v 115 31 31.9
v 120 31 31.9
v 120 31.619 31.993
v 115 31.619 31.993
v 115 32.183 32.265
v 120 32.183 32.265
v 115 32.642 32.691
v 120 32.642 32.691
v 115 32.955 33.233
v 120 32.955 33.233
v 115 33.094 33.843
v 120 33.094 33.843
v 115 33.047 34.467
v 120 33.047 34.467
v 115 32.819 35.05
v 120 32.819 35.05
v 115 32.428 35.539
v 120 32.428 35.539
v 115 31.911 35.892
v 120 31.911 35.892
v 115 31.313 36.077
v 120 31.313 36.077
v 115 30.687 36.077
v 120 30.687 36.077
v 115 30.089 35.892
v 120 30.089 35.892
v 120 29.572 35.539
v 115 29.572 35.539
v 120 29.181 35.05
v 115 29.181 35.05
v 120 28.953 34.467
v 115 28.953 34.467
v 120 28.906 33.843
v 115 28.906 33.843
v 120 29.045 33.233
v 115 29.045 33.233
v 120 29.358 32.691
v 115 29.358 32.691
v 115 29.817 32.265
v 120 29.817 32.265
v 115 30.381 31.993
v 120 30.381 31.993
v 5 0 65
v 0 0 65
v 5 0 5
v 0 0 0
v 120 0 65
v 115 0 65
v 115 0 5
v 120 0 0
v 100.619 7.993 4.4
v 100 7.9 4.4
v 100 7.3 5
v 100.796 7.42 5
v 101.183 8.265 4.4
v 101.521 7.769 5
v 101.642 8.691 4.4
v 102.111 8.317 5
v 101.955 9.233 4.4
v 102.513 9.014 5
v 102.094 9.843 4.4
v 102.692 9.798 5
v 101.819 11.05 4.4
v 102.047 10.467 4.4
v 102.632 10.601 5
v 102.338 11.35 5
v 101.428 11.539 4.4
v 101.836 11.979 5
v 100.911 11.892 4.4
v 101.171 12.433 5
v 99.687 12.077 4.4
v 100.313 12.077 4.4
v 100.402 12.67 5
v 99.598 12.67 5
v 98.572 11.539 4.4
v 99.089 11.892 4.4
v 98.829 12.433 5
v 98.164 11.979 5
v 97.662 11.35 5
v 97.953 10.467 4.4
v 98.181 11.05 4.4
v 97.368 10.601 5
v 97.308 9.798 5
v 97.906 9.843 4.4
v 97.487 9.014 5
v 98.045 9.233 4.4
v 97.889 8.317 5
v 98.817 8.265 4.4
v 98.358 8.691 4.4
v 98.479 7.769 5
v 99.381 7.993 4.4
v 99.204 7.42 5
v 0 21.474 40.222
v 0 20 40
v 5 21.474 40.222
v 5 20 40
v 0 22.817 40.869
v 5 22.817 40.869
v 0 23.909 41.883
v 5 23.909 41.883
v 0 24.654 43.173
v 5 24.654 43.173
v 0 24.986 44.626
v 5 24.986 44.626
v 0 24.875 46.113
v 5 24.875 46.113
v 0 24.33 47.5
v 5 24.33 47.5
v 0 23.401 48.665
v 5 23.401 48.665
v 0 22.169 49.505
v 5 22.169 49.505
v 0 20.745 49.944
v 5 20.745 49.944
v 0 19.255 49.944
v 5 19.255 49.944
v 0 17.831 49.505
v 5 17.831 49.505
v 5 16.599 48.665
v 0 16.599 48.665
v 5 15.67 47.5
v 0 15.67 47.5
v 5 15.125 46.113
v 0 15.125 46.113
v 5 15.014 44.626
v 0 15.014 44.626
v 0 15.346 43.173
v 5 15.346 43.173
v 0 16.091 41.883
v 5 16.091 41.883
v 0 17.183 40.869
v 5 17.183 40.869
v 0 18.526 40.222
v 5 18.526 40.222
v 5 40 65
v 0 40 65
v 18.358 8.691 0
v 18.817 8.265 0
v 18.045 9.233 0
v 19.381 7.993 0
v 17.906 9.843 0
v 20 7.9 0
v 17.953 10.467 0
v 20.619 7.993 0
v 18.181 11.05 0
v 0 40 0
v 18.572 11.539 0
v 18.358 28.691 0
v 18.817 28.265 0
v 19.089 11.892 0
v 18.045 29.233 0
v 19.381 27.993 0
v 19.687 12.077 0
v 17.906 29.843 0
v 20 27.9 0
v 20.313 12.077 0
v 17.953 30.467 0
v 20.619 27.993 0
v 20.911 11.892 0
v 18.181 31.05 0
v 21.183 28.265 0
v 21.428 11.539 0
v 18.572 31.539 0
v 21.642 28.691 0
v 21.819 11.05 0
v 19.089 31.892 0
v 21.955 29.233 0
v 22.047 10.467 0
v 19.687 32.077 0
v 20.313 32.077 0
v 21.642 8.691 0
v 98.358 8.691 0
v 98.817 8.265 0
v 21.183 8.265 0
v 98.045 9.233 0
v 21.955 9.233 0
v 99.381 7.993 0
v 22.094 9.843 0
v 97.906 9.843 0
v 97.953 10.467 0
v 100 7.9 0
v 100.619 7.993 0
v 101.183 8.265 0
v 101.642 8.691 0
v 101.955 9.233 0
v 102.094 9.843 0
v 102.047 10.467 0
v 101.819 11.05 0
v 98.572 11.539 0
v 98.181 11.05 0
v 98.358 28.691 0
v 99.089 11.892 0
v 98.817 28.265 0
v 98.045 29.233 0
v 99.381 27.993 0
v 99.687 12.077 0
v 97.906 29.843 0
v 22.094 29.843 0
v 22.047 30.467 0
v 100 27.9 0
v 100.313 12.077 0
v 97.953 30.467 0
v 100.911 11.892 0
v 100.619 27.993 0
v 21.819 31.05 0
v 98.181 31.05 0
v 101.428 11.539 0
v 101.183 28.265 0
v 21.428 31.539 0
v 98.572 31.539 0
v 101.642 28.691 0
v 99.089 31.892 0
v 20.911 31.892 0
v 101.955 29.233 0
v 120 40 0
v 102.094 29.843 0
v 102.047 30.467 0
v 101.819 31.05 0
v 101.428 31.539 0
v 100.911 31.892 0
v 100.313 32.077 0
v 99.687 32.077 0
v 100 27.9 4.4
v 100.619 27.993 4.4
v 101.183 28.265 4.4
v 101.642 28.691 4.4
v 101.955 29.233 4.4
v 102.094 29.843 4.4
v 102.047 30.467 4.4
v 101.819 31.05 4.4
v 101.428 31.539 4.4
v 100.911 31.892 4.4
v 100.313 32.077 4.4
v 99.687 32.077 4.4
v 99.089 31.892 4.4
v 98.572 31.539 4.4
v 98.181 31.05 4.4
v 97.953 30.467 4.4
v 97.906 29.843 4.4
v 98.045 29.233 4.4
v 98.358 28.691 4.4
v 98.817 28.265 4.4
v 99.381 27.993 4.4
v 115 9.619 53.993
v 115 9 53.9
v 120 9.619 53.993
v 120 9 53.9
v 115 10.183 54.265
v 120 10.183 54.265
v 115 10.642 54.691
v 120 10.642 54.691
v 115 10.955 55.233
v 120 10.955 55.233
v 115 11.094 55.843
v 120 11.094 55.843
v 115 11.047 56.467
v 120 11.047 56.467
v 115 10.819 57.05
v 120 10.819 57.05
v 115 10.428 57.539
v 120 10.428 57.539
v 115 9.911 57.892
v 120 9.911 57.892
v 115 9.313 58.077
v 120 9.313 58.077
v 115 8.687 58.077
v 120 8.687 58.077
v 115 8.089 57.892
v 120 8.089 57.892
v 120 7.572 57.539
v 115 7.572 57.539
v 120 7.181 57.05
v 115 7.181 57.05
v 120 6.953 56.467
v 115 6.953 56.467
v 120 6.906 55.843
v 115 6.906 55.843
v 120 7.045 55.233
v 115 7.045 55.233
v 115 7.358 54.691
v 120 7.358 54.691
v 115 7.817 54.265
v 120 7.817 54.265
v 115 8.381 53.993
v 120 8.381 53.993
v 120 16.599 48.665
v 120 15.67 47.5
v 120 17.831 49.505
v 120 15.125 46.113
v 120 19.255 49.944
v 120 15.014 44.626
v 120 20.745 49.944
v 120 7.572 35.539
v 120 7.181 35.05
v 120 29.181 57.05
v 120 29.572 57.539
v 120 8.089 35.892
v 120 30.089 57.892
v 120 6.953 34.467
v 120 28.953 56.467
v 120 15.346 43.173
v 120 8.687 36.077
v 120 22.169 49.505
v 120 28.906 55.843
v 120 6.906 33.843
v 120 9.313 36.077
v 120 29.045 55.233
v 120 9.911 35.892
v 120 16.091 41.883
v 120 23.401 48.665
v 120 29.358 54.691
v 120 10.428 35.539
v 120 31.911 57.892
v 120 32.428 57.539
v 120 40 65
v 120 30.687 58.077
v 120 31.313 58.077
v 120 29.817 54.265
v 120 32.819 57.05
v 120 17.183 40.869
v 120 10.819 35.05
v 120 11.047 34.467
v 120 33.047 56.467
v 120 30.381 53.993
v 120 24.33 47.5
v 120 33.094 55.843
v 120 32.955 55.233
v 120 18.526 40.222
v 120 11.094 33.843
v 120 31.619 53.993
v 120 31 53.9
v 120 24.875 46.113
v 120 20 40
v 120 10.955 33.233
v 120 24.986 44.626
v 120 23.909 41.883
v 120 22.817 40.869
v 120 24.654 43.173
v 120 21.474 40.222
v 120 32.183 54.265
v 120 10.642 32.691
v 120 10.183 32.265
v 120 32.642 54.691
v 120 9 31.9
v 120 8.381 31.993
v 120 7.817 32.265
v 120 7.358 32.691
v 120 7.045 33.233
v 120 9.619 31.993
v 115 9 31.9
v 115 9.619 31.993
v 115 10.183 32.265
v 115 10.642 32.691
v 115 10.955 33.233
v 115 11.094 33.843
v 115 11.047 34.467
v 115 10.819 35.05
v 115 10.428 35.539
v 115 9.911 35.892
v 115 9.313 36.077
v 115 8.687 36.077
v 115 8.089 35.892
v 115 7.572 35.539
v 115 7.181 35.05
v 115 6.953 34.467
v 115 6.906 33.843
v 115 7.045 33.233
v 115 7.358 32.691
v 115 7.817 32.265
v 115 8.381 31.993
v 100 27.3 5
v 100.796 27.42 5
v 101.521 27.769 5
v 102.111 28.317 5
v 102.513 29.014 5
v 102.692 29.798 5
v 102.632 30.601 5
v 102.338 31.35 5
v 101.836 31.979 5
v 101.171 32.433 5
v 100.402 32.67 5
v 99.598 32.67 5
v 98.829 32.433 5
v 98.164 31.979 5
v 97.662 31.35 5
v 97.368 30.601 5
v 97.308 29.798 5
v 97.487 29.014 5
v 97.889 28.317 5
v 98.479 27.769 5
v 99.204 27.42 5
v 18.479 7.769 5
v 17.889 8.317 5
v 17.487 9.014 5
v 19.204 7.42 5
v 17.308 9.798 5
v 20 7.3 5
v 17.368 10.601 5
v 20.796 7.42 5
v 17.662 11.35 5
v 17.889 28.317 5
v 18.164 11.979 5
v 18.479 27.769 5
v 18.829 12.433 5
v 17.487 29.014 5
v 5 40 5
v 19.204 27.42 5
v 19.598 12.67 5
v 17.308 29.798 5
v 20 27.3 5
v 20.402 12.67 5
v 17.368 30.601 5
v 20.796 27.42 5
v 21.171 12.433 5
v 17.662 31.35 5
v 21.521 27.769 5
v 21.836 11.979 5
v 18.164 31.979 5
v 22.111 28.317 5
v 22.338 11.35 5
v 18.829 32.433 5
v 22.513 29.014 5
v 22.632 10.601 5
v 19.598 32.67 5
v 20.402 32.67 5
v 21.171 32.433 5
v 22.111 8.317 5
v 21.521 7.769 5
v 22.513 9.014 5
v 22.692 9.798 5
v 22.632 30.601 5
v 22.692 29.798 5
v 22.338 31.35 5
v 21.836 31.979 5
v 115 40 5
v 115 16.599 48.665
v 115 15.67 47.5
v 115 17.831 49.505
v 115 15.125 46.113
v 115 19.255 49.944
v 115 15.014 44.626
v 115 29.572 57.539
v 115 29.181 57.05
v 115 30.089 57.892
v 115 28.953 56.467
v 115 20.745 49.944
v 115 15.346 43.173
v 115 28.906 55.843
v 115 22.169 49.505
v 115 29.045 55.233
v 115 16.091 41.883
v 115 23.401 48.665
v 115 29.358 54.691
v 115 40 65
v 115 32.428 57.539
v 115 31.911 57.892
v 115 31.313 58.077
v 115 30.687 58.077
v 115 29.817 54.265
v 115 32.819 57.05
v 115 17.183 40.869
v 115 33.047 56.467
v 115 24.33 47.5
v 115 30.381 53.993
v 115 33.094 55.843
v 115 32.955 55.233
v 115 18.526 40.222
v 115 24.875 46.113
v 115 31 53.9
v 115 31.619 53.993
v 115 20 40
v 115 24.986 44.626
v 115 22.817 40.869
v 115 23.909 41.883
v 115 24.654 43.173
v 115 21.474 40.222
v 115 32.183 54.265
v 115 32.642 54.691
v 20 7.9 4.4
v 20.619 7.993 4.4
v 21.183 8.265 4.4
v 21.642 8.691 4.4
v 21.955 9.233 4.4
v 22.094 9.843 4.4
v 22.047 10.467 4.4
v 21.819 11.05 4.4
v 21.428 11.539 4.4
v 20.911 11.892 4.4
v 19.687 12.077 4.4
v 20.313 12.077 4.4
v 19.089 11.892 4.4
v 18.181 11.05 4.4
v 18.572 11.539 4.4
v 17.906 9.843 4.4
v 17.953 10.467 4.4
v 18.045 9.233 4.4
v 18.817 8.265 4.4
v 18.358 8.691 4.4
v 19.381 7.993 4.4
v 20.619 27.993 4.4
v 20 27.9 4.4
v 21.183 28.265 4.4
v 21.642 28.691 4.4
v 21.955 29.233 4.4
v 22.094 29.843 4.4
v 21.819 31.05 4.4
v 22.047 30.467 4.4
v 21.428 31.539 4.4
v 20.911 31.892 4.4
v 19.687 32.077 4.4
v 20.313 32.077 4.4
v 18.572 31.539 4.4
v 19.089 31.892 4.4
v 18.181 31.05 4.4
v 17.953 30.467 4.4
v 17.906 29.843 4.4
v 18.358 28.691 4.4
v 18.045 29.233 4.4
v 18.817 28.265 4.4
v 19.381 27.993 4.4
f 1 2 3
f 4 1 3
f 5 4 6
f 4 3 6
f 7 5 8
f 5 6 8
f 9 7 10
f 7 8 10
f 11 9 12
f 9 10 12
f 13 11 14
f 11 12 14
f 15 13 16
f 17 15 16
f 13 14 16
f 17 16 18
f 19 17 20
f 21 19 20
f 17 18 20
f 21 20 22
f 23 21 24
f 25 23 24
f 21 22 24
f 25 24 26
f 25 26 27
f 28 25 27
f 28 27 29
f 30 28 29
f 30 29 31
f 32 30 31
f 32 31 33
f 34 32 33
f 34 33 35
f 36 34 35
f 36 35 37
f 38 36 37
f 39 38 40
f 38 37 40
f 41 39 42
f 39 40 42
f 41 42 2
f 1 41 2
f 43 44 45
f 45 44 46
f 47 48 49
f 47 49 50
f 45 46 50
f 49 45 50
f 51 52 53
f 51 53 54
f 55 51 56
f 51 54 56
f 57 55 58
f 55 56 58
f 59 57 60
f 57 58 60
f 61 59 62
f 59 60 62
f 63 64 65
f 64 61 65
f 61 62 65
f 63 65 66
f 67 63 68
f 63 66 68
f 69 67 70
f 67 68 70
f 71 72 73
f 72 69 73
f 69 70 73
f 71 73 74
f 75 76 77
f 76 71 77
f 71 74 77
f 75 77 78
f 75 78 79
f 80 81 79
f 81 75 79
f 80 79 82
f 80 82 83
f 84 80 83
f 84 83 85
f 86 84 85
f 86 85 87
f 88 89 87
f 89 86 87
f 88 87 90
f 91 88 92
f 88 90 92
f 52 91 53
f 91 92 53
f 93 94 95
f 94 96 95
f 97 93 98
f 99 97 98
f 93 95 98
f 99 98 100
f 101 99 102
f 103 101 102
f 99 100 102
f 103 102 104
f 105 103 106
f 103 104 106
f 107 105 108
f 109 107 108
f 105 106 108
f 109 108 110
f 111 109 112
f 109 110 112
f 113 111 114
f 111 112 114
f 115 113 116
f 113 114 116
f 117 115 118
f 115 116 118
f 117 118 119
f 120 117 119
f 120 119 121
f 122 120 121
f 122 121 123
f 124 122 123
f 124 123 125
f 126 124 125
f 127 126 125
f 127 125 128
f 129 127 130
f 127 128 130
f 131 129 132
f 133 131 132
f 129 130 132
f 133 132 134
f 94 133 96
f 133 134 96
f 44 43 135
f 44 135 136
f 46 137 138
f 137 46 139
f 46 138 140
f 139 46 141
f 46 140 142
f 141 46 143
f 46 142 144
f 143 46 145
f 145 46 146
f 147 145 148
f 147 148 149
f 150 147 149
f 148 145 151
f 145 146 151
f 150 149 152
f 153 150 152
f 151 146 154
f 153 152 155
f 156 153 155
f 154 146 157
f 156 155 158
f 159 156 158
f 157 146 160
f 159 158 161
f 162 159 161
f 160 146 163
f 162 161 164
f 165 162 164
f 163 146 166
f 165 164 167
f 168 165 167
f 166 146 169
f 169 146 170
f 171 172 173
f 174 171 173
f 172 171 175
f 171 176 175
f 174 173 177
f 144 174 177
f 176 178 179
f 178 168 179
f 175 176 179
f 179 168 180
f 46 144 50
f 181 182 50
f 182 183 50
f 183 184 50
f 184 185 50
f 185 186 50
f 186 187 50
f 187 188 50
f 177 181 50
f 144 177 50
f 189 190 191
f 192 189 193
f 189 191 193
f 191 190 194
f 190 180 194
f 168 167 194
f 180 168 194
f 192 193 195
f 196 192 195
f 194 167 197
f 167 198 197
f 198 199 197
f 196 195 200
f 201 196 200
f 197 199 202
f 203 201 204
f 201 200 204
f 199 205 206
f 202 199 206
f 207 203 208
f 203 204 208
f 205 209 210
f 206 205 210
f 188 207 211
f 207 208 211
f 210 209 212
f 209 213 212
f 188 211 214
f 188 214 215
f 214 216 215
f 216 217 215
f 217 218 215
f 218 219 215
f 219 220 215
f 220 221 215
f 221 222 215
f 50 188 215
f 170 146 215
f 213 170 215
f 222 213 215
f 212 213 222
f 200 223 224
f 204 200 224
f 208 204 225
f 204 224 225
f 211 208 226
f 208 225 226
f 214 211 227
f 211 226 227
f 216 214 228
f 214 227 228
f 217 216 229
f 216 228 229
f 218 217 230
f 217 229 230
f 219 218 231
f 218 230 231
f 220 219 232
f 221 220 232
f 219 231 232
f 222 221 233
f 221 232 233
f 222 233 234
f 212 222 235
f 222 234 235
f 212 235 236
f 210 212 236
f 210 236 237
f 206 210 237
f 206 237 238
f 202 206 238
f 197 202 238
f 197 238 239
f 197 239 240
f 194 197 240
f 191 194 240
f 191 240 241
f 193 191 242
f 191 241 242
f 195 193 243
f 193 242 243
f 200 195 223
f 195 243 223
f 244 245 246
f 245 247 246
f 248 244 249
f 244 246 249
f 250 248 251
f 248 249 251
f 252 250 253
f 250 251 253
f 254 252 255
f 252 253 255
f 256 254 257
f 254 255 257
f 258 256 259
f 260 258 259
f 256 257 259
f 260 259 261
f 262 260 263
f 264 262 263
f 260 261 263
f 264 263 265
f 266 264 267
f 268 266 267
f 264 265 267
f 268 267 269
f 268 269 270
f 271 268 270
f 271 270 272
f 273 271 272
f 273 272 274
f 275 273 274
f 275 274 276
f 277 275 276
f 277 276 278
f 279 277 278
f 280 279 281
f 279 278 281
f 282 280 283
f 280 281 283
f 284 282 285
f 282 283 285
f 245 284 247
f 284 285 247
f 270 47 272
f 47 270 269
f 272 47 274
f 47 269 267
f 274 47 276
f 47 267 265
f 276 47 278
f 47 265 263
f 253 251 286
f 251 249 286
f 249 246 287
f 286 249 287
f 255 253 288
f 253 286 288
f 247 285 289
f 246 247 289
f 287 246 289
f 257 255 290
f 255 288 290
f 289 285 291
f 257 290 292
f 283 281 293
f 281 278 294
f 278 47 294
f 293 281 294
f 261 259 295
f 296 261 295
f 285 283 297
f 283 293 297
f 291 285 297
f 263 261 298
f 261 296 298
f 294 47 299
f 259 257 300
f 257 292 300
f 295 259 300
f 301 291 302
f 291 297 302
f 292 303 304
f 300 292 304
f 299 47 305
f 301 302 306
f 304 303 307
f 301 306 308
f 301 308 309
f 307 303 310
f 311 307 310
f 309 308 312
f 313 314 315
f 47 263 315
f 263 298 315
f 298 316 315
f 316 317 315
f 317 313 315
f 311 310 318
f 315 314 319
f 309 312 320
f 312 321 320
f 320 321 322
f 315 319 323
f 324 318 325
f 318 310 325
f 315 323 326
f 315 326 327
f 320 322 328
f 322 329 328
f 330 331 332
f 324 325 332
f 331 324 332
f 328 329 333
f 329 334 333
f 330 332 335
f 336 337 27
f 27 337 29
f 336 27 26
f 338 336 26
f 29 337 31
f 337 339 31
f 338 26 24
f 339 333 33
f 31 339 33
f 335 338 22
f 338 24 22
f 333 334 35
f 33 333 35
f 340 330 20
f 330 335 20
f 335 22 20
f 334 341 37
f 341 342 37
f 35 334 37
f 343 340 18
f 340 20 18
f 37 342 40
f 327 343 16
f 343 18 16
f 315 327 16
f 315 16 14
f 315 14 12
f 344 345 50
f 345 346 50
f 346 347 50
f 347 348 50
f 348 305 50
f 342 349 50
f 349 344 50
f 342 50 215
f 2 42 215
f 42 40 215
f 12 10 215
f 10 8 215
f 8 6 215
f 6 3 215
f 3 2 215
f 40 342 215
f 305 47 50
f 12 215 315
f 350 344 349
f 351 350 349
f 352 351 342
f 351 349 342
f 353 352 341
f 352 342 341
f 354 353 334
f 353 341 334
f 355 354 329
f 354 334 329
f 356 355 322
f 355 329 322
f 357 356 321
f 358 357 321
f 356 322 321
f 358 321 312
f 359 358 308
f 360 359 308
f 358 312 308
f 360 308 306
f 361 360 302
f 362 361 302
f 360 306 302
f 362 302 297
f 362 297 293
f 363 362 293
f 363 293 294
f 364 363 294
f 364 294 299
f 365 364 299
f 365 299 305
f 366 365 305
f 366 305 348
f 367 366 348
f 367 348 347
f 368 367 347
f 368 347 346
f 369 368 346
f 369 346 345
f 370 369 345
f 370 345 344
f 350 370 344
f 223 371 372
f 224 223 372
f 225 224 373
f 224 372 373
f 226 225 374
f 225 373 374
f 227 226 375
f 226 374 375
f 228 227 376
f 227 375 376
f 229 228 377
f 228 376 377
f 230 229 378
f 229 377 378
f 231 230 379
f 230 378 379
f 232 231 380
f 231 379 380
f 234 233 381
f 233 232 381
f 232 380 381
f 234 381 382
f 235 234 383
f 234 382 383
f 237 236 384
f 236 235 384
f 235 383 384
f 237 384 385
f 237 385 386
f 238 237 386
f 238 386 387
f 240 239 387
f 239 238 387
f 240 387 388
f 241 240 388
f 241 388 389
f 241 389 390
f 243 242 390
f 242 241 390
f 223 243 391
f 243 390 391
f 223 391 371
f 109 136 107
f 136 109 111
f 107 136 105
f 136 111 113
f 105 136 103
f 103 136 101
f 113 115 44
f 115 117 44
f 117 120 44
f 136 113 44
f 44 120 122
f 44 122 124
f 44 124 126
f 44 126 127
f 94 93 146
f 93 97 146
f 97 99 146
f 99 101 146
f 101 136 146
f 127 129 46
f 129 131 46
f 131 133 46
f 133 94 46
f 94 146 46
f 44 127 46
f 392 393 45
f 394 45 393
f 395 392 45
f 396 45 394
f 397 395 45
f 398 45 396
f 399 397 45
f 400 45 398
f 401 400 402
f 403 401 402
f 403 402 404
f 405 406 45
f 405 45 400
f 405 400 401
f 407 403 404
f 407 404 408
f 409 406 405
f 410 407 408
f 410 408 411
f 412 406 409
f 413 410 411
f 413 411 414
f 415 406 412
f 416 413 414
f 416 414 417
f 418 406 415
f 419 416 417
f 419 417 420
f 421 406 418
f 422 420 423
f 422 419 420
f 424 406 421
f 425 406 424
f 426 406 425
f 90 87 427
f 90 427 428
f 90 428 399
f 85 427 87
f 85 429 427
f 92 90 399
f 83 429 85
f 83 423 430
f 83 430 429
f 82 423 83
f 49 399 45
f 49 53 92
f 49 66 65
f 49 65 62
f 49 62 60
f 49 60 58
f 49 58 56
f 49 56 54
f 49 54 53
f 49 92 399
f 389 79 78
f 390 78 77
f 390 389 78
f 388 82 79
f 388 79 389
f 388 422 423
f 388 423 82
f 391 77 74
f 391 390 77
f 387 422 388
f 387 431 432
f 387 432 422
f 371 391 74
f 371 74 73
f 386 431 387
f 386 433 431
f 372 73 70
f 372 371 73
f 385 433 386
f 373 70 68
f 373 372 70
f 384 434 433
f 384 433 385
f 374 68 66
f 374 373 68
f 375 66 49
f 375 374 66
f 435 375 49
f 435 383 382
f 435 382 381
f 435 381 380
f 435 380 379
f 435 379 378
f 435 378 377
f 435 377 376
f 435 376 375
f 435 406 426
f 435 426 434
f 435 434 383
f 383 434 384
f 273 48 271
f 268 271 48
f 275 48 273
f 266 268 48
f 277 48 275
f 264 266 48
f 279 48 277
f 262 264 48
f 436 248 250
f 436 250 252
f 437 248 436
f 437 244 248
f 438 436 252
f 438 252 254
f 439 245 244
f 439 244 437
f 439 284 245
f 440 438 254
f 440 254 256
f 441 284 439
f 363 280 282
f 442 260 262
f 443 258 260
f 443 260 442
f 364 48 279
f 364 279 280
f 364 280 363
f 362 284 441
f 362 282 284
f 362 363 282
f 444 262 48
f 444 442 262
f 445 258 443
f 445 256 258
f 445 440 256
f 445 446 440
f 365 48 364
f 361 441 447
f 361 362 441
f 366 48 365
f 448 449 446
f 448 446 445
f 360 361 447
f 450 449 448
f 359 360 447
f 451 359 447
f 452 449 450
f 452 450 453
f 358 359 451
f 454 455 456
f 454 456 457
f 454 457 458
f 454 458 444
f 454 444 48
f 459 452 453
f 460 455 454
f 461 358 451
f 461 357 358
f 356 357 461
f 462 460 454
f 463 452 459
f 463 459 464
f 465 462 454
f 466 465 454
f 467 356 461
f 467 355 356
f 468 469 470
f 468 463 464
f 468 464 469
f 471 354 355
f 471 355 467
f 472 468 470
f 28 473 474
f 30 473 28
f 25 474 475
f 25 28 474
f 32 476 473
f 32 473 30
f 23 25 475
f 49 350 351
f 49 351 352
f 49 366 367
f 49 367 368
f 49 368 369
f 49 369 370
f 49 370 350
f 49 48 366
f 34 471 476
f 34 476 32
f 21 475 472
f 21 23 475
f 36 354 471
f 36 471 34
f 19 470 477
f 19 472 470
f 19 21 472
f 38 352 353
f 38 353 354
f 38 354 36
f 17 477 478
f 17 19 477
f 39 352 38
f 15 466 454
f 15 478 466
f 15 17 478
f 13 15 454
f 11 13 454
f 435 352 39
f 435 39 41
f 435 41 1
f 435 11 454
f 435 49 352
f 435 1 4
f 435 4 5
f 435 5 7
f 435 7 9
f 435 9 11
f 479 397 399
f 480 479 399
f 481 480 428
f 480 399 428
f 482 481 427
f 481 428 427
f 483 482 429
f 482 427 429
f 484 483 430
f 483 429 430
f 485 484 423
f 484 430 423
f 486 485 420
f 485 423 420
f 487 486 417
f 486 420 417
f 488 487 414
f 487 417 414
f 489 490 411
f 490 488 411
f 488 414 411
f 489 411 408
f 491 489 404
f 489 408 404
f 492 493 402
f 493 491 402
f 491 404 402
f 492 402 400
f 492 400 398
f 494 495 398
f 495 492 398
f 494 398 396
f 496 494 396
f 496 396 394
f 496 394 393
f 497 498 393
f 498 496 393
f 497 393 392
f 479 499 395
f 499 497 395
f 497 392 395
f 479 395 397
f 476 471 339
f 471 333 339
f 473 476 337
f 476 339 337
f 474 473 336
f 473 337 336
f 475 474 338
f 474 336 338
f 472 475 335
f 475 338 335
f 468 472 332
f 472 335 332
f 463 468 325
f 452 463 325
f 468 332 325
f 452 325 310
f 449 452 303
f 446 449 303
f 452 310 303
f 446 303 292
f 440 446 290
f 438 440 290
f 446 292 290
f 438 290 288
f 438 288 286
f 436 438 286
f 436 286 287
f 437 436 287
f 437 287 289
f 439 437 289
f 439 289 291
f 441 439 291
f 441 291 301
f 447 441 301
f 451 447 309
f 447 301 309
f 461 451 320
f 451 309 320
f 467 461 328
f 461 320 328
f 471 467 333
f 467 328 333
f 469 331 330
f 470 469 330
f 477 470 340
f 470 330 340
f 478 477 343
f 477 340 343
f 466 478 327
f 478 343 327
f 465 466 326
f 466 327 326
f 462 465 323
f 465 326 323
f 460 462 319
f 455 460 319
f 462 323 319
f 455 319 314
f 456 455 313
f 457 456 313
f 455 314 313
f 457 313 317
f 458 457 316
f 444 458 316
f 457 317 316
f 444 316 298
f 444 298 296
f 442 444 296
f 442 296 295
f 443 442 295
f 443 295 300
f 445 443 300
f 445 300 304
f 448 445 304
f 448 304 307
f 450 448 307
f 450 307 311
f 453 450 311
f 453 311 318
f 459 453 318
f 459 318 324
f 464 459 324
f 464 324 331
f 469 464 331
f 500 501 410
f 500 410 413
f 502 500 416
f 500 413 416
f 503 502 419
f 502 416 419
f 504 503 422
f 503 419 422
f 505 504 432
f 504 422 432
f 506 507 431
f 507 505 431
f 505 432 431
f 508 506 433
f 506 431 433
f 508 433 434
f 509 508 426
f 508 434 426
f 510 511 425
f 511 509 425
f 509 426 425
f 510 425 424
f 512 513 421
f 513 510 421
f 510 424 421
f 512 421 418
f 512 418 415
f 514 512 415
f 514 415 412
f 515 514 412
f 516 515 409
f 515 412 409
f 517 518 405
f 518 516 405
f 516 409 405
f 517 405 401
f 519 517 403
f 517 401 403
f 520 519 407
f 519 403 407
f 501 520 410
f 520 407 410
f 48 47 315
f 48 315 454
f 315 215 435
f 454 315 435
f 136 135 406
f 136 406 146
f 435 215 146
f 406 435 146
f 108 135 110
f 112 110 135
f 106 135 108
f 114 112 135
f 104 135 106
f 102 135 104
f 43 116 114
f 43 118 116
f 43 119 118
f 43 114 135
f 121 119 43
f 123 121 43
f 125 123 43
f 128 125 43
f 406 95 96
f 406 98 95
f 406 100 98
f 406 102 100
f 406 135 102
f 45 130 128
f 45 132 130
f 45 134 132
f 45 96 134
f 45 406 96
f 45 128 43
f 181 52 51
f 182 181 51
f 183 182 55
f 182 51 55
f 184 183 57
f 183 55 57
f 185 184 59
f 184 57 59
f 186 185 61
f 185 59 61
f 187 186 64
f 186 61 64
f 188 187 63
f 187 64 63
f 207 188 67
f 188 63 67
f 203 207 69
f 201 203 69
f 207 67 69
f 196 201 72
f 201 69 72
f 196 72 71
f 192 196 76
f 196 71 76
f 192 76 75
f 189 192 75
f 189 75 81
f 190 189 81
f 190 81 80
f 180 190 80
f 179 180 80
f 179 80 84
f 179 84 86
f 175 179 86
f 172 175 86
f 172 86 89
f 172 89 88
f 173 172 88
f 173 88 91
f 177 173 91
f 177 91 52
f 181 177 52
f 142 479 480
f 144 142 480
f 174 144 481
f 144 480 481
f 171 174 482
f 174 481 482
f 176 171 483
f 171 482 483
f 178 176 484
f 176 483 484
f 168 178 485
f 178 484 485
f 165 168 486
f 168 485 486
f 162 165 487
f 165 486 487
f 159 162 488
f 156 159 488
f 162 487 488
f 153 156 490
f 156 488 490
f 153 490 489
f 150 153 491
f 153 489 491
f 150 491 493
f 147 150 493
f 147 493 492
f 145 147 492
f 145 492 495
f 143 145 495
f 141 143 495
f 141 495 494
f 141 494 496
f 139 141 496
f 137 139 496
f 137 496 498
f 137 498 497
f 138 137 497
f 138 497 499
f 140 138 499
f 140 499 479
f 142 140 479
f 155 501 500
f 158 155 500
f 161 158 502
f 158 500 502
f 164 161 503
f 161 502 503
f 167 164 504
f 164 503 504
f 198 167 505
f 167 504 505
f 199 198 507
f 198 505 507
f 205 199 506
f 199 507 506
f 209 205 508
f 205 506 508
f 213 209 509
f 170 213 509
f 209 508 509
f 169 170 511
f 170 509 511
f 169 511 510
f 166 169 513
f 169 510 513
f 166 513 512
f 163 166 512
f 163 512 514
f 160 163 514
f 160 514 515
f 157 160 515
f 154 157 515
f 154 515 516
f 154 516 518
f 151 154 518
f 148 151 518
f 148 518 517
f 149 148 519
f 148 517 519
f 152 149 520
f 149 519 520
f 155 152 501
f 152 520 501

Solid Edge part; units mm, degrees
sketch "Sketch1" plane through (0, 0, 0) normal (0, 0, 1) x (1, 0, 0)
  line L0 (120, 40) -> (0, 40)
  line L1 (0, 40) -> (0, 0)
  line L2 (0, 0) -> (120, 0)
  line L3 (120, 0) -> (120, 40)
extrude "Protrusion1" add sketch "Sketch1" along normal blind 5
sketch "Sketch2" plane through (60, 20, 5) normal (0, 0, 1) x (1, 0, 0)
  line L0 (55, -20) -> (55, 20)
  line L1 (55, 20) -> (60, 20)
  line L2 (60, 20) -> (60, -20)
  line L3 (60, -20) -> (55, -20)
  line L4 (-55, 20) -> (-55, -20)
  line L5 (-55, -20) -> (-60, -20)
  line L6 (-60, -20) -> (-60, 20)
  line L7 (-60, 20) -> (-55, 20)
  dimension "D1" = 5
extrude "Extrusionsausprägung_2" add sketch "Sketch2" along normal blind 60
hole "Bohrung_1" at (120, 20, 45) direction (-1, 0, 0) diameter 10 end through all
hole "Hole_2" at (20, 10, 5) direction (0, 0, -1) diameter 4.2 end up to next start chamfer 0.6 start chamfer angle 45
hole "Hole1" at (20, 30, 5) direction (0, 0, -1) diameter 4.2 end up to next start chamfer 0.6 start chamfer angle 45
hole "Hole2" at (100, 30, 5) direction (0, 0, -1) diameter 4.2 end up to next start chamfer 0.6 start chamfer angle 45
hole "Hole3" at (100, 10, 5) direction (0, 0, -1) diameter 4.2 end up to next start chamfer 0.6 start chamfer angle 45
hole "Hole4" at (120, 9, 56) direction (-1, 0, 0) diameter 4.2 end up to next
hole "Hole5" at (120, 9, 34) direction (-1, 0, 0) diameter 4.2 end up to next
hole "Hole6" at (120, 31, 34) direction (-1, 0, 0) diameter 4.2 end up to next
hole "Hole7" at (120, 31, 56) direction (-1, 0, 0) diameter 4.2 end up to next
